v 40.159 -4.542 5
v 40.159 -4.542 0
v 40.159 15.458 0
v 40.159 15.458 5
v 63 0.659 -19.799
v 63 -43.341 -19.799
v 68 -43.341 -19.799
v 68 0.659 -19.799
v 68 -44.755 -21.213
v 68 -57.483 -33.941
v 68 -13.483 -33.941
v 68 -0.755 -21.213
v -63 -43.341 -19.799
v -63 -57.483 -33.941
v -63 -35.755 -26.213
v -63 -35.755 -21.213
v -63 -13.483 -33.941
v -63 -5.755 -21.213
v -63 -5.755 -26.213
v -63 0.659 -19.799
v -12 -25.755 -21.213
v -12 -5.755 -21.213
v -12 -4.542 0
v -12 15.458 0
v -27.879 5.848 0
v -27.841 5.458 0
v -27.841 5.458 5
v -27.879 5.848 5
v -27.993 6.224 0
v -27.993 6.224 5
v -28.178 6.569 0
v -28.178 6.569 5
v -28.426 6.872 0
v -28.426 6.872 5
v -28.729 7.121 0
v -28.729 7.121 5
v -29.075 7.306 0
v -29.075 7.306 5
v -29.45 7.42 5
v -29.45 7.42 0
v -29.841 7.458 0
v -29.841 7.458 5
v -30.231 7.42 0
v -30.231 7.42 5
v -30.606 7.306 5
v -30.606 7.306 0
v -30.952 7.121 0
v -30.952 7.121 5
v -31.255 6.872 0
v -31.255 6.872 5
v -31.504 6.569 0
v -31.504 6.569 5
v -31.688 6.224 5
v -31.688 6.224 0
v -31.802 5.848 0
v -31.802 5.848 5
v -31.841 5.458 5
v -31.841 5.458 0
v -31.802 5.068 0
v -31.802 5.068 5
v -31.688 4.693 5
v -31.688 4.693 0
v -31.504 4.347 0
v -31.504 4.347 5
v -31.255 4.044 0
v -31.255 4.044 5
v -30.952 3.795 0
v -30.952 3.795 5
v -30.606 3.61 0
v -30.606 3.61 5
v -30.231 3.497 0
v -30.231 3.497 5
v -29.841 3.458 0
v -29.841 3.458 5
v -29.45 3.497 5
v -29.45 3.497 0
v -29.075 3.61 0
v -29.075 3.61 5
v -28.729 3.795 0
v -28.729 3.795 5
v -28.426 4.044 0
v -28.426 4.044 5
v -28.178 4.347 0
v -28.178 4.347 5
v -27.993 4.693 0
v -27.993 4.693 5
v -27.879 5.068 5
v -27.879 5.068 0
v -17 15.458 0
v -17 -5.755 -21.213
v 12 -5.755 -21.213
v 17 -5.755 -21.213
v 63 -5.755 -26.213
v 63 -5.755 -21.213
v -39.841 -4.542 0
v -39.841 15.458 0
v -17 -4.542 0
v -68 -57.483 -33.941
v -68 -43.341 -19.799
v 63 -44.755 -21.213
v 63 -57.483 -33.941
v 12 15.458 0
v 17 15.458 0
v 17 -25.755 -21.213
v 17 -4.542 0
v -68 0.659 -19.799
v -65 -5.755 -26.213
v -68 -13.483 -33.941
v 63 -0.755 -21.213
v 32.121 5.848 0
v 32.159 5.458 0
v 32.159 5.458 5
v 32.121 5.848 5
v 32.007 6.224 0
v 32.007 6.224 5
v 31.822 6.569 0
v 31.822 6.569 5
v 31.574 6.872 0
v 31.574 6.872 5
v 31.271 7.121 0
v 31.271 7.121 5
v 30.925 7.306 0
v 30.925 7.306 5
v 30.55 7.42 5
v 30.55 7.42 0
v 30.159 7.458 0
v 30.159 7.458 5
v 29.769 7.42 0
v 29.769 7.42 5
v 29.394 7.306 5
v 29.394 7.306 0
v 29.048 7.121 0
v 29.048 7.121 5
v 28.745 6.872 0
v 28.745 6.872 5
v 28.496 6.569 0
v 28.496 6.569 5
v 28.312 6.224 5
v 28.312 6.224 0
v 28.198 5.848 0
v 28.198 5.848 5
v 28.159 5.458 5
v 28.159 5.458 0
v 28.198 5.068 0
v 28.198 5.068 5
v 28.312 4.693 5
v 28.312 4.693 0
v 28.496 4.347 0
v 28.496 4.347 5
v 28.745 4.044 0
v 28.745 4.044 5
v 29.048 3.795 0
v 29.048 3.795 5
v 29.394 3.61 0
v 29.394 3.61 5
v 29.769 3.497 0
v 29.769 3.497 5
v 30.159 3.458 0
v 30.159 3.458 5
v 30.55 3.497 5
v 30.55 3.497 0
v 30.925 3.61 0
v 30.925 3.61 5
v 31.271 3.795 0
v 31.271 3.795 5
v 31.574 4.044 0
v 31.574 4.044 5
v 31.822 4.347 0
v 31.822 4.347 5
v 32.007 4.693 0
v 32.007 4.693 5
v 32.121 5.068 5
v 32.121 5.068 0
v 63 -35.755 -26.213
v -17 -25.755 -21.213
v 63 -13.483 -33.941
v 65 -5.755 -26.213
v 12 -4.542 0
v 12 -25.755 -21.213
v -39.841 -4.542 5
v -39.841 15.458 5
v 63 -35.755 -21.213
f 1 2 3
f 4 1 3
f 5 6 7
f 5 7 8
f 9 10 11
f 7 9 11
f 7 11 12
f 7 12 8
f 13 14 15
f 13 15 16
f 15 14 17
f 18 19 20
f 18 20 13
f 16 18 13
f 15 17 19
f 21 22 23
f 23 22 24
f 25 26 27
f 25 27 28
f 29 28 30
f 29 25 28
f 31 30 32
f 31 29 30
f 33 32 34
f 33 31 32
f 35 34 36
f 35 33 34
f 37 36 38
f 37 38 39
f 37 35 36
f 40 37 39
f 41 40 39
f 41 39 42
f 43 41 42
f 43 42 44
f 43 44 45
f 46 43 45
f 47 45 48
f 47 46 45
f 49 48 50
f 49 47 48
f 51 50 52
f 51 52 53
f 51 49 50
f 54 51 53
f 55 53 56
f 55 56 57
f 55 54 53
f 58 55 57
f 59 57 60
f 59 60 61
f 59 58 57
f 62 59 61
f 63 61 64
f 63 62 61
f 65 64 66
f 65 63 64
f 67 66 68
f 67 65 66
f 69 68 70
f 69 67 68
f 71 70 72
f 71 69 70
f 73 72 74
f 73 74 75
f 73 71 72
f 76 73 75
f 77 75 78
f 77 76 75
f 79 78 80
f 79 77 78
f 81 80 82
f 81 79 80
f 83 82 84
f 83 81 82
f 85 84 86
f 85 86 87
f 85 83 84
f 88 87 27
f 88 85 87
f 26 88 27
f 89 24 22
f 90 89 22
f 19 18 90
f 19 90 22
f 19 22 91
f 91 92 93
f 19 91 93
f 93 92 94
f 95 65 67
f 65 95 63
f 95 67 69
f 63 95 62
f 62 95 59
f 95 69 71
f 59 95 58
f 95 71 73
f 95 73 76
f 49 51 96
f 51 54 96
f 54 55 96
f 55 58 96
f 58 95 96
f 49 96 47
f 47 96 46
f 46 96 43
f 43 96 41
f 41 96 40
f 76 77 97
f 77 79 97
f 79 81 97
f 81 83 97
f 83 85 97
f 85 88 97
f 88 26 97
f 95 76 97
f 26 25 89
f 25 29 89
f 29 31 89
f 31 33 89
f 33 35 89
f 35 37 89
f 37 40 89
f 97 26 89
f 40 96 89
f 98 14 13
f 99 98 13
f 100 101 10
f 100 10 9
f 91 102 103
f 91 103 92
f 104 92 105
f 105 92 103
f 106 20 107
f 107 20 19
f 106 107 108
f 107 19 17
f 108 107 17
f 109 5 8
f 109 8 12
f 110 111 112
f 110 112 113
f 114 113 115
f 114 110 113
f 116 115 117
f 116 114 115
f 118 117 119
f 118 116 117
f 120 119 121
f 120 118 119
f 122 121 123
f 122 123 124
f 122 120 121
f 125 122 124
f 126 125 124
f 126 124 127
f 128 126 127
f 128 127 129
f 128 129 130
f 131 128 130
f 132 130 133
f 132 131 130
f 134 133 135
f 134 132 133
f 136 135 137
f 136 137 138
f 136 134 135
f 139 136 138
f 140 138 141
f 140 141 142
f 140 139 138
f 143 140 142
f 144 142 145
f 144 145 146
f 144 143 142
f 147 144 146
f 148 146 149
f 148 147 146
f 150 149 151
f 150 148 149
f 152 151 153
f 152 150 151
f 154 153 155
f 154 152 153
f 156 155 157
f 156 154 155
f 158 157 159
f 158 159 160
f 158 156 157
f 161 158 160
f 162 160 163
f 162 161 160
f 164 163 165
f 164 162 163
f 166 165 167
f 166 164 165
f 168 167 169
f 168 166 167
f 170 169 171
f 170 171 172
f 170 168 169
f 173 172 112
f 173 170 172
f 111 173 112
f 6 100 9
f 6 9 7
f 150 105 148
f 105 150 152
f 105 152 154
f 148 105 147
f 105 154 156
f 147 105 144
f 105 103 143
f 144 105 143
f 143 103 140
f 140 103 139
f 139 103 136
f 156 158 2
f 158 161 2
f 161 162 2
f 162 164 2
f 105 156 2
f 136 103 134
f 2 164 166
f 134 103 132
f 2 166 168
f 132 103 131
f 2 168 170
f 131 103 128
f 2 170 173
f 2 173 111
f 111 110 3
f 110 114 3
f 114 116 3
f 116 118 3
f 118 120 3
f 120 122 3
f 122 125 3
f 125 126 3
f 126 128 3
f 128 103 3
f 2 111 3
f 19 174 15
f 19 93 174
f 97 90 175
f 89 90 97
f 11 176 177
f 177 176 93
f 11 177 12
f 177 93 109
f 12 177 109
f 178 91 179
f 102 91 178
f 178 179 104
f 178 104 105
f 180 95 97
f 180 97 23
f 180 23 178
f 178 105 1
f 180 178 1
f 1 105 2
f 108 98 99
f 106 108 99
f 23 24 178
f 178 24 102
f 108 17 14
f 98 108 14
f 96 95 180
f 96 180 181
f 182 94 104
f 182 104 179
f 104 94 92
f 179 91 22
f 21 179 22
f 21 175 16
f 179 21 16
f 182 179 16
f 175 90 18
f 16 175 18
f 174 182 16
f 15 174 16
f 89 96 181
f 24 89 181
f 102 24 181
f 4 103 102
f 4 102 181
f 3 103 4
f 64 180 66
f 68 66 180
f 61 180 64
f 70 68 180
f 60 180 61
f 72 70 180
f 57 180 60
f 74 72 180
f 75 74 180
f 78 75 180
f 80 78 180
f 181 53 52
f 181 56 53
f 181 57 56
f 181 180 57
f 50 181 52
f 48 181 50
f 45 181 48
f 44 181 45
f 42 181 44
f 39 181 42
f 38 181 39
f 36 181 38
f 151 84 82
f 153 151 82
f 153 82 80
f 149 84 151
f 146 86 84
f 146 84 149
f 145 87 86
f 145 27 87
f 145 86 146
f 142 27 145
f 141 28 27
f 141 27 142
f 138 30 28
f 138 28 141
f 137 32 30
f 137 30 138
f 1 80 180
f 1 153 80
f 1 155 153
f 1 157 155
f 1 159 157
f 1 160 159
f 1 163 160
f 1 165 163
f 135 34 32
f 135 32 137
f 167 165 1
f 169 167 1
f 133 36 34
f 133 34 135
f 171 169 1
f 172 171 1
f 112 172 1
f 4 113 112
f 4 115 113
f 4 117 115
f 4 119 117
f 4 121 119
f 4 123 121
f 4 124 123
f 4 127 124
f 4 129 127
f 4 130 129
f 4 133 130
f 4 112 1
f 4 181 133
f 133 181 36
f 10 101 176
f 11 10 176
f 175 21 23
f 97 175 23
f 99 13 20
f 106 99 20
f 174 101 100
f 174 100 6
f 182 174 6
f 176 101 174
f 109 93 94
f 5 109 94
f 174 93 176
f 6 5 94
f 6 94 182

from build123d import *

# Parameters (mm, degrees)
SKETCH1_W            = 80
SKETCH1_H            = 20
SKETCH1_R            = 2
BOSS_EXTRUDE1_DEPTH  = 5
BOSS_EXTRUDE2_DEPTH  = 5
BOSS_EXTRUDE3_DEPTH  = 5
BOSS_EXTRUDE4_DEPTH  = 5
BOSS_EXTRUDE9_DEPTH  = 5
BOSS_EXTRUDE10_DEPTH = 5


with BuildPart() as part:
    # Sketch1 → Boss-Extrude1 (new body)
    with BuildSketch(Plane.XY):
        with Locations((0.15936255, 5.458167331)):
            Rectangle(SKETCH1_W, SKETCH1_H)
        with Locations((-29.84063745, 5.458167331)):
            Circle(SKETCH1_R, mode=Mode.SUBTRACT)
        with Locations((30.15936255, 5.458167331)):
            Circle(SKETCH1_R, mode=Mode.SUBTRACT)
    extrude(amount=BOSS_EXTRUDE1_DEPTH)

    # Sketch2 → Boss-Extrude2 (add)
    with BuildSketch(Plane(origin=(12, 0, 0), x_dir=(0, 0, -1), z_dir=(1, 0, 0))):
        Polygon((0, 15.458167331), (21.213203436, -5.755036105), (21.213203436, -25.755036105), (0, -4.541832669), align=None)
    extrude(amount=BOSS_EXTRUDE2_DEPTH)

    # Sketch3 → Boss-Extrude3 (add)
    with BuildSketch(Plane(origin=(-12, 0, 0), x_dir=(0, 0, -1), z_dir=(1, 0, 0))):
        Polygon((0, 15.458167331), (21.213203436, -5.755036105), (21.213203436, -25.755036105), (0, -4.541832669), align=None)
    extrude(amount=-BOSS_EXTRUDE3_DEPTH)

    # Sketch4 → Boss-Extrude4 (add)
    with BuildSketch(Plane(origin=(0, 0, -21.213203436), x_dir=(-1, 0, 0), z_dir=(0, 0, -1))):
        Polygon((65, -5.755036105), (-17, -5.755036105), (-65, -5.755036105), (-65, -25.127384199), (-65, -32.826103917), (-65, -35.755036105), (65, -35.755036105), (65, -32.826103917), (65, -25.561464244), align=None)
    extrude(amount=BOSS_EXTRUDE4_DEPTH)

    # Sketch6 → Boss-Extrude9 (add)
    with BuildSketch(Plane(origin=(63, 0, 0), x_dir=(0, 0, -1), z_dir=(1, 0, 0))):
        Polygon((26.213203436, -5.755036105), (33.941125497, -13.482958166), (33.941125497, -50.554025978), (33.941125497, -55.554025978), (33.941125497, -57.482958166), (21.213203436, -44.755036105), (19.798989873, -43.340822543), (19.798989873, 0.659177457), (21.213203436, -0.755036105), align=None)
    extrude(amount=BOSS_EXTRUDE9_DEPTH)

    # Sketch8 → Boss-Extrude10 (add)
    with BuildSketch(Plane.ZY.offset(63)):
        Polygon((-19.798989873, 0.659177457), (-33.941125497, -13.482958166), (-33.941125497, -57.482958166), (-19.798989873, -43.340822543), align=None)
    extrude(amount=BOSS_EXTRUDE10_DEPTH)


solid = part.part
